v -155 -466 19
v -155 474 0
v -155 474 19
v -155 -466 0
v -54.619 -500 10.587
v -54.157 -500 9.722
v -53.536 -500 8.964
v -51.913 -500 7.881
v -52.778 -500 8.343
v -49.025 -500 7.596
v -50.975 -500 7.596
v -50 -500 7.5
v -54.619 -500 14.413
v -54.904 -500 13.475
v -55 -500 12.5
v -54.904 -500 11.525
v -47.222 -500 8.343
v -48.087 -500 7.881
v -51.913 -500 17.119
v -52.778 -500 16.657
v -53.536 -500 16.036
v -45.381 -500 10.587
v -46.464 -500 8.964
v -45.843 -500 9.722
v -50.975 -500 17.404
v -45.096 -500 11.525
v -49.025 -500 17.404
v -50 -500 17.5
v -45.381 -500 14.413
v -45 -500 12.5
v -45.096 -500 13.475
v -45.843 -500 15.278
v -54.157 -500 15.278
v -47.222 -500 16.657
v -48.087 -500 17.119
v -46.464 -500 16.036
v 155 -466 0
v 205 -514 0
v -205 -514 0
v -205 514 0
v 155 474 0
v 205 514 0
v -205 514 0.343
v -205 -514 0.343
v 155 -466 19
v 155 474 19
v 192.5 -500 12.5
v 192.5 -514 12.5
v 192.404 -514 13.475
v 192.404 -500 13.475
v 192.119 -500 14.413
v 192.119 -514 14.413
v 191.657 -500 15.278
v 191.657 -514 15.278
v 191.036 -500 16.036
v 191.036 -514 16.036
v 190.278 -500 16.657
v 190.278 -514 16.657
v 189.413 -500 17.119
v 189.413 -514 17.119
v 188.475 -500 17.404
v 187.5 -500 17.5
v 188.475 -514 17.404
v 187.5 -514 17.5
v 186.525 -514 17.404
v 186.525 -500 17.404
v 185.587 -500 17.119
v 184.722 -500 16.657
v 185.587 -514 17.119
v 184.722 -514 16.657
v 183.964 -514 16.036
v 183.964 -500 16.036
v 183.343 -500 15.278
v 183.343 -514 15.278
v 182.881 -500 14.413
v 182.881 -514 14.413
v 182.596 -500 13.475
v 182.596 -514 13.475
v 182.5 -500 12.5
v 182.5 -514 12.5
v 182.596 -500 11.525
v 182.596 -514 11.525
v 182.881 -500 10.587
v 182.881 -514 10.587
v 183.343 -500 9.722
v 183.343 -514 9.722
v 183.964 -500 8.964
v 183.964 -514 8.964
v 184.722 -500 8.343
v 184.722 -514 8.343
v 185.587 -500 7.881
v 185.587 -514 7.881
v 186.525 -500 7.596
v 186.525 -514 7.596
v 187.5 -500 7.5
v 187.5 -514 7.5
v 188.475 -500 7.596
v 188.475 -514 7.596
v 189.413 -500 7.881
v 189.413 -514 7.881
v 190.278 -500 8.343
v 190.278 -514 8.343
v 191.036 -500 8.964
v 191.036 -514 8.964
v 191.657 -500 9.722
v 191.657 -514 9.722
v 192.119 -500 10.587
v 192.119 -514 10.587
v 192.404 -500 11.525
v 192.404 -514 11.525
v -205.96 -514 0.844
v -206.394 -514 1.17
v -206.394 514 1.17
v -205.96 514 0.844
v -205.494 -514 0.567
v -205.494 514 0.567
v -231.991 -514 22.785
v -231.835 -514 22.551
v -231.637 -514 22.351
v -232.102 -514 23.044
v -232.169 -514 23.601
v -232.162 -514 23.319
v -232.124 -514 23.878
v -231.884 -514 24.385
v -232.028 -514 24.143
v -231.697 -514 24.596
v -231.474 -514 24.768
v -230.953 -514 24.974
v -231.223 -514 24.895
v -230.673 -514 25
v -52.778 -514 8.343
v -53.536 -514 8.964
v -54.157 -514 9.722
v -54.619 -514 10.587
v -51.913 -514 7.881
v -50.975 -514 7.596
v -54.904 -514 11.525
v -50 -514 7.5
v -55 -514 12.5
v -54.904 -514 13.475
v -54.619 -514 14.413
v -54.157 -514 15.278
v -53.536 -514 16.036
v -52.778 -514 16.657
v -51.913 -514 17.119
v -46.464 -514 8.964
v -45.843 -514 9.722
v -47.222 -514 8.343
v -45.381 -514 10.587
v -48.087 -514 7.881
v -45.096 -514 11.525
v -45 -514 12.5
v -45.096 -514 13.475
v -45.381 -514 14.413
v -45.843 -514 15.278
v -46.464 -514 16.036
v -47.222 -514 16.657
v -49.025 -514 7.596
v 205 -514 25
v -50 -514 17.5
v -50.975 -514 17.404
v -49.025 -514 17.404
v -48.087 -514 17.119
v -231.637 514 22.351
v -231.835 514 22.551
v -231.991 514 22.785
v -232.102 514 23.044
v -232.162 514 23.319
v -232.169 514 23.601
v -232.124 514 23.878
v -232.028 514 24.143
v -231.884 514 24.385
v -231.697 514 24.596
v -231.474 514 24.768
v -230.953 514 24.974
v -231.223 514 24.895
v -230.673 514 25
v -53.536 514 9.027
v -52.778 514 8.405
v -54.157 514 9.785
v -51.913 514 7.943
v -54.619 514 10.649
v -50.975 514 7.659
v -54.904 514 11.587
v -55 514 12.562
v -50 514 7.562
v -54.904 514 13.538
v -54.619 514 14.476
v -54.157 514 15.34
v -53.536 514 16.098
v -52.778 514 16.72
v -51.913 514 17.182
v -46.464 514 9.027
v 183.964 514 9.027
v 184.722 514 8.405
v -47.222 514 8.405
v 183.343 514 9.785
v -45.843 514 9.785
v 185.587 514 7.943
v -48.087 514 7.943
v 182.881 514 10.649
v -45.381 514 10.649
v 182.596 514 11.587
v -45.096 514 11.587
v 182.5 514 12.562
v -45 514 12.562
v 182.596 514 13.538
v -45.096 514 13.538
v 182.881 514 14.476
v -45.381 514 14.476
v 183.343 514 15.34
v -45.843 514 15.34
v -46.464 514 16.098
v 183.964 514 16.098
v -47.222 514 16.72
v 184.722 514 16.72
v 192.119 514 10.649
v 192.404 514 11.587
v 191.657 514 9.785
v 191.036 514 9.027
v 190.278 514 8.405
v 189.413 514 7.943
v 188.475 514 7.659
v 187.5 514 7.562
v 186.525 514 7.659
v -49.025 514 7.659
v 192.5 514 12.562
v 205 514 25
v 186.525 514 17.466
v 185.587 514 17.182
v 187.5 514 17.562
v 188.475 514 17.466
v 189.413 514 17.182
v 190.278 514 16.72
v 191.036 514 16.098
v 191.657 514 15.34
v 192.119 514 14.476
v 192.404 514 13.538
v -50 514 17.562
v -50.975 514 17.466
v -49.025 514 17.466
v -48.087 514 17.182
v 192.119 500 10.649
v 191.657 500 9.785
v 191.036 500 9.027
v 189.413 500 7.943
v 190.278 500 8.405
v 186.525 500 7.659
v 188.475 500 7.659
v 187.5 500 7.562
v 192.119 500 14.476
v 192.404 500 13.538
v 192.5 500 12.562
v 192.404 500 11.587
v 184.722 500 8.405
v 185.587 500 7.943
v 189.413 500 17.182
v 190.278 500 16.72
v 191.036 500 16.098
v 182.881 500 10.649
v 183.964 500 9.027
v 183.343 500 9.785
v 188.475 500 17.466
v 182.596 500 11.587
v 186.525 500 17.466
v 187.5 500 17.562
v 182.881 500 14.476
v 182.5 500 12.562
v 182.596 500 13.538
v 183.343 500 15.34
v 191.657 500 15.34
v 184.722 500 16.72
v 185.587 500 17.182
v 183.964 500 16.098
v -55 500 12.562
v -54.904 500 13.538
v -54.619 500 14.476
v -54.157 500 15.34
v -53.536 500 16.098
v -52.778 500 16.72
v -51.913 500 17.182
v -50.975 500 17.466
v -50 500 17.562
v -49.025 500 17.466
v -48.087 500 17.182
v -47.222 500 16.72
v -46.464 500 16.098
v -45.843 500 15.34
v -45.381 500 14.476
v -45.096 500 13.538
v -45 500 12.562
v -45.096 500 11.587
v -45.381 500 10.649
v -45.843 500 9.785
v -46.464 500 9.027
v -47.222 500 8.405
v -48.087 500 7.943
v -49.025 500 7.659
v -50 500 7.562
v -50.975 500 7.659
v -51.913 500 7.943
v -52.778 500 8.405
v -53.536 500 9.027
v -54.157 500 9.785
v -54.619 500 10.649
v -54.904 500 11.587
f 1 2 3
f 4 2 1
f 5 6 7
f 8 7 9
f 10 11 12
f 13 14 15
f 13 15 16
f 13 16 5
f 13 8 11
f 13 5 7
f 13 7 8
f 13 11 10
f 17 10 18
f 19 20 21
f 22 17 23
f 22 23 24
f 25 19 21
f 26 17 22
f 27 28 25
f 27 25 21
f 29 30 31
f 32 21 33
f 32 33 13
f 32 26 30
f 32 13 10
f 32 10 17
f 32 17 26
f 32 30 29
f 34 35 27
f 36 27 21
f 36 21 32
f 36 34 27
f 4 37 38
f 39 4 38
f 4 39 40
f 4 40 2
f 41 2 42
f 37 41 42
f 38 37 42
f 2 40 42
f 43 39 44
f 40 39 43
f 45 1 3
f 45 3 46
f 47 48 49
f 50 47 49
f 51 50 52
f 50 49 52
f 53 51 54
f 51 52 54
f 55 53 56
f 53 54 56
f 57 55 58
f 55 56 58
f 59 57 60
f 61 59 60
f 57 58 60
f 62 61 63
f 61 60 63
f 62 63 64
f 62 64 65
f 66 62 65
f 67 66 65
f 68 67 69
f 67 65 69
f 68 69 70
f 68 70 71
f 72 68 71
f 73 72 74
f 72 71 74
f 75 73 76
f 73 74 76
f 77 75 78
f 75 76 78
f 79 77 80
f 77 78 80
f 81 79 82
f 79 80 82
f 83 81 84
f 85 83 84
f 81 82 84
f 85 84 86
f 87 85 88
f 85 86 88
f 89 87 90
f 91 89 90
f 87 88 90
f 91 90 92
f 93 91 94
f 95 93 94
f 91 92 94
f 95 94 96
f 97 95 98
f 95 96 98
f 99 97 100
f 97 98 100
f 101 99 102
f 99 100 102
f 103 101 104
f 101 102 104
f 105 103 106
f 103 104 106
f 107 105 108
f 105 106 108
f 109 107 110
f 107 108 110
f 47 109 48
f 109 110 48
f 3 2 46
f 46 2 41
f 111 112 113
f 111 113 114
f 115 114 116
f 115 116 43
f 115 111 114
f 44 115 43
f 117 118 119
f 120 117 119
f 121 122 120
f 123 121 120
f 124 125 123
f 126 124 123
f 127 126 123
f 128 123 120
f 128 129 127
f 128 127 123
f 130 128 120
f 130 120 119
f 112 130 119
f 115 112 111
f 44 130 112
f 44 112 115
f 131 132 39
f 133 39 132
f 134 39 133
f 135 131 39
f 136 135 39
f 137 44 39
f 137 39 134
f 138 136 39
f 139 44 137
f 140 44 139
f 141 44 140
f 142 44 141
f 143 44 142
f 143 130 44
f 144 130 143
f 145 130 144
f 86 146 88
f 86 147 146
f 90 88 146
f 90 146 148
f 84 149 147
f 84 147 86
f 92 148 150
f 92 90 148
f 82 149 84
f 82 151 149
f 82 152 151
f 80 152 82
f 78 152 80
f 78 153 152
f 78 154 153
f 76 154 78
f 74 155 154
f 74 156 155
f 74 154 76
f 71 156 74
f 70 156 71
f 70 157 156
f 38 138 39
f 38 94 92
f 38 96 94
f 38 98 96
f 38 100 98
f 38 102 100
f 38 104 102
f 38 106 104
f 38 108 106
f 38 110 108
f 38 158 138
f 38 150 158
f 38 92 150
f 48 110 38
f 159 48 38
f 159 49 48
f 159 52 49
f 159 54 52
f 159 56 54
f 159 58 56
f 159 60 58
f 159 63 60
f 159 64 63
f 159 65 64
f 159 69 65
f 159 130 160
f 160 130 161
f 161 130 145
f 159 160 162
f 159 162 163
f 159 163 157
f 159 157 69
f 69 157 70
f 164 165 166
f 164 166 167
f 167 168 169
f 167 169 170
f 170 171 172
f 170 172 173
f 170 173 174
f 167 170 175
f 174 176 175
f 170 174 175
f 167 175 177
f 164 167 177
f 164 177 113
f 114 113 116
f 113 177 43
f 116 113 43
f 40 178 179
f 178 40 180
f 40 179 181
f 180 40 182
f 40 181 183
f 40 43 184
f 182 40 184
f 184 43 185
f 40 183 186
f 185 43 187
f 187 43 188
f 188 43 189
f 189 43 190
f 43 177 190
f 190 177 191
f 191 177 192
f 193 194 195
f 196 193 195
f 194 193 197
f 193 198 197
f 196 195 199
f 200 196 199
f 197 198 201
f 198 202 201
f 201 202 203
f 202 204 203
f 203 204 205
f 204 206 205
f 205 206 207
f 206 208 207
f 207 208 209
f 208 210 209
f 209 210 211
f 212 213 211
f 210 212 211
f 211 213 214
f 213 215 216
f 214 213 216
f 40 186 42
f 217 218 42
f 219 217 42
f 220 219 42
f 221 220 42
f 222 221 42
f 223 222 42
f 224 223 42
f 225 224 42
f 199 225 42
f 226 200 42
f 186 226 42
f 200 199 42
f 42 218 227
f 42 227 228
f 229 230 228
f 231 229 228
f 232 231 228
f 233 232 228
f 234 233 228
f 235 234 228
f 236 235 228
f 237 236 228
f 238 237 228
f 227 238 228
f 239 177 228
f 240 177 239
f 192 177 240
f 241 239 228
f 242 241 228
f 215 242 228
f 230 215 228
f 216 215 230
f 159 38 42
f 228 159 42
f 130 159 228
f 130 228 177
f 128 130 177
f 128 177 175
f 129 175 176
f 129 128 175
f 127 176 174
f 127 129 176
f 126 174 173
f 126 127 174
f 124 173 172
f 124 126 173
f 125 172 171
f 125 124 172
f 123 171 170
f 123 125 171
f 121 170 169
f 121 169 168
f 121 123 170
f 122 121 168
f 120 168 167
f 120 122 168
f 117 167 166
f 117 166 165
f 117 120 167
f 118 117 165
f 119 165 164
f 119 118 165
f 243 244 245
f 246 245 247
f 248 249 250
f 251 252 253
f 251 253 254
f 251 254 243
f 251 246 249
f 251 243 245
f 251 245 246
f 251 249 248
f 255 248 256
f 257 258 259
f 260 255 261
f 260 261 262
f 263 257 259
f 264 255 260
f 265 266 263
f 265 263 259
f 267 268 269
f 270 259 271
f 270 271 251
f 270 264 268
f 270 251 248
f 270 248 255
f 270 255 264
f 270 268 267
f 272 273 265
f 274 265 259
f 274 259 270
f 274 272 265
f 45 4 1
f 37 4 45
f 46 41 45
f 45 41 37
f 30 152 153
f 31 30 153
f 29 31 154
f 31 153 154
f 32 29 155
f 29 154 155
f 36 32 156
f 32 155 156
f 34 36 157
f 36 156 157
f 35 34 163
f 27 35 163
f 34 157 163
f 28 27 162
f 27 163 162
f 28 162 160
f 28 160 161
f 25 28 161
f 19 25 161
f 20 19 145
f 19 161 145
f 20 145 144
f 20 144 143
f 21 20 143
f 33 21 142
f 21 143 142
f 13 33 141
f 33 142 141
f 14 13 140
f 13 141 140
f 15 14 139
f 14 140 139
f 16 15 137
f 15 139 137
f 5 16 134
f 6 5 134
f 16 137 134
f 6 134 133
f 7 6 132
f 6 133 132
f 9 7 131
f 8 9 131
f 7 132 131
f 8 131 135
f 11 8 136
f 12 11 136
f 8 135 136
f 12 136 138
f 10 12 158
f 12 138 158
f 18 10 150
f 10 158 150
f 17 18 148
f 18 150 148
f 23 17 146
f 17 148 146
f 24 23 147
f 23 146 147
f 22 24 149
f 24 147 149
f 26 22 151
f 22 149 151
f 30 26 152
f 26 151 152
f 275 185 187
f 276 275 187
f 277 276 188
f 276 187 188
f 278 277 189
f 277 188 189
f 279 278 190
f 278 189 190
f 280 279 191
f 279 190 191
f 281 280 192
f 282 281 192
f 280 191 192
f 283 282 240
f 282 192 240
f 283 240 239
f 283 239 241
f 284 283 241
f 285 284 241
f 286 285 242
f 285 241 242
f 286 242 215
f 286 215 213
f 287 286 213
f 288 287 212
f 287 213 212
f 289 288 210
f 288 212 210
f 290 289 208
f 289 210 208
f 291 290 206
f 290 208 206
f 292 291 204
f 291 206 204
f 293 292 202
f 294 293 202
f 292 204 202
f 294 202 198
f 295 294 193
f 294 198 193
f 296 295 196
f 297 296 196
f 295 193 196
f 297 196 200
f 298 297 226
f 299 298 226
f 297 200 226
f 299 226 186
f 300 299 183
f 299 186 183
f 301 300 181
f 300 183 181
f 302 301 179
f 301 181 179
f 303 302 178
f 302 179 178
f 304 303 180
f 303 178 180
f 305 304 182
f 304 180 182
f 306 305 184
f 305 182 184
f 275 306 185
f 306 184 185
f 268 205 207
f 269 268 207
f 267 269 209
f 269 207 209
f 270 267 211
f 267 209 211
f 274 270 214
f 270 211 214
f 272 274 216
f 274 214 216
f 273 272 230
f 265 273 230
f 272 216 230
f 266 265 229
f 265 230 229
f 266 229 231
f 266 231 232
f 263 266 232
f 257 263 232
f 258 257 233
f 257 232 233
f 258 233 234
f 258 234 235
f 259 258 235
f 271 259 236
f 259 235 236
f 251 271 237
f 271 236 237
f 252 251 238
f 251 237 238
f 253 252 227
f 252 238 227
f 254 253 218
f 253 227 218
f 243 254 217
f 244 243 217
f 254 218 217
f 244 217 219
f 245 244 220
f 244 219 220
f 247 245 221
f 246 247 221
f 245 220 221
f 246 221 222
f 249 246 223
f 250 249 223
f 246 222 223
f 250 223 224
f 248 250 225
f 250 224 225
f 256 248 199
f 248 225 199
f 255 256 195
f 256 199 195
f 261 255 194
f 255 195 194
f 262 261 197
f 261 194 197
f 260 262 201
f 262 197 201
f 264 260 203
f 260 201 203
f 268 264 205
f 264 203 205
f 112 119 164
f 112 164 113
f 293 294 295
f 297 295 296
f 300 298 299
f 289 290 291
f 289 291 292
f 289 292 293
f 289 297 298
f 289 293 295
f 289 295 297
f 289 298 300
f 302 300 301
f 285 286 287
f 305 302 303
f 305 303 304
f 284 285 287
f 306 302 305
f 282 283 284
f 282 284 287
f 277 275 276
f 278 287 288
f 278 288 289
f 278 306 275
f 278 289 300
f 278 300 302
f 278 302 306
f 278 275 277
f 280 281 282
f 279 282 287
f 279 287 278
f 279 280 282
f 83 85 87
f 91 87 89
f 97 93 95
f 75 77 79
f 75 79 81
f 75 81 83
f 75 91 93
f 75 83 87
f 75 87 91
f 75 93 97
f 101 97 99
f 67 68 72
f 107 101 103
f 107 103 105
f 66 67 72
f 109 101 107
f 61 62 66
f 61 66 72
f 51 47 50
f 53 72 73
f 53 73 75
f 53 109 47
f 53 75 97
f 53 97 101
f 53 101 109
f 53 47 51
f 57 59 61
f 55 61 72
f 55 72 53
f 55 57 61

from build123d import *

# Parameters (mm, degrees)
F0_W     = 410
F0_H     = 1028
F1_DEPTH = 25
F2_R     = 5
F3_DEPTH = 14
F4_R     = 5
F5_DEPTH = 14
F7_DEPTH = 1028
F8_W     = 310
F8_H     = 940
F9_DEPTH = 19


with BuildPart() as f1:
    # F0 (on Top) → F1 (new body)
    with BuildSketch(Plane.XY):
        Rectangle(F0_W, F0_H)
    extrude(amount=F1_DEPTH)

    # F2 (on face) → F3 (cut)
    with BuildSketch(Plane.XZ.offset(514)):
        with Locations((187.5, 12.5)):
            Circle(F2_R)
        with Locations((-50, 12.5)):
            Circle(F2_R)
    extrude(amount=-F3_DEPTH, mode=Mode.SUBTRACT)

    # F4 (on face) → F5 (cut)
    with BuildSketch(Plane(origin=(0, 514, 0), x_dir=(-1, 0, 0), z_dir=(0, 1, 0))):
        with Locations((-187.5, 12.5625)):
            Circle(F4_R)
        with Locations((50, 12.5625)):
            Circle(F4_R)
    extrude(amount=-F5_DEPTH, mode=Mode.SUBTRACT)

    # F6 (on face) → F7 (join)
    with BuildSketch(Plane.XZ.offset(514)):
        with BuildLine():
            Line((-205, 0.342944), (-205, 25))
            Line((-205, 25), (-230.672767, 25))
            ThreePointArc((-230.672767, 25), (-232.082307, 24.013028), (-231.636945, 22.350931))
            Line((-231.636945, 22.350931), (-206.394084, 1.169769))
            ThreePointArc((-206.394084, 1.169769), (-205.730769, 0.699491), (-205, 0.342944))
        make_face()
    extrude(amount=-F7_DEPTH)

    # F8 (on face) → F9 (cut)
    with BuildSketch(Plane(origin=(0, 0, 0), x_dir=(1, 0, 0), z_dir=(0, 0, -1))):
        with Locations((0, -4)):
            Rectangle(F8_W, F8_H)
    extrude(amount=-F9_DEPTH, mode=Mode.SUBTRACT)


solid = f1.part
